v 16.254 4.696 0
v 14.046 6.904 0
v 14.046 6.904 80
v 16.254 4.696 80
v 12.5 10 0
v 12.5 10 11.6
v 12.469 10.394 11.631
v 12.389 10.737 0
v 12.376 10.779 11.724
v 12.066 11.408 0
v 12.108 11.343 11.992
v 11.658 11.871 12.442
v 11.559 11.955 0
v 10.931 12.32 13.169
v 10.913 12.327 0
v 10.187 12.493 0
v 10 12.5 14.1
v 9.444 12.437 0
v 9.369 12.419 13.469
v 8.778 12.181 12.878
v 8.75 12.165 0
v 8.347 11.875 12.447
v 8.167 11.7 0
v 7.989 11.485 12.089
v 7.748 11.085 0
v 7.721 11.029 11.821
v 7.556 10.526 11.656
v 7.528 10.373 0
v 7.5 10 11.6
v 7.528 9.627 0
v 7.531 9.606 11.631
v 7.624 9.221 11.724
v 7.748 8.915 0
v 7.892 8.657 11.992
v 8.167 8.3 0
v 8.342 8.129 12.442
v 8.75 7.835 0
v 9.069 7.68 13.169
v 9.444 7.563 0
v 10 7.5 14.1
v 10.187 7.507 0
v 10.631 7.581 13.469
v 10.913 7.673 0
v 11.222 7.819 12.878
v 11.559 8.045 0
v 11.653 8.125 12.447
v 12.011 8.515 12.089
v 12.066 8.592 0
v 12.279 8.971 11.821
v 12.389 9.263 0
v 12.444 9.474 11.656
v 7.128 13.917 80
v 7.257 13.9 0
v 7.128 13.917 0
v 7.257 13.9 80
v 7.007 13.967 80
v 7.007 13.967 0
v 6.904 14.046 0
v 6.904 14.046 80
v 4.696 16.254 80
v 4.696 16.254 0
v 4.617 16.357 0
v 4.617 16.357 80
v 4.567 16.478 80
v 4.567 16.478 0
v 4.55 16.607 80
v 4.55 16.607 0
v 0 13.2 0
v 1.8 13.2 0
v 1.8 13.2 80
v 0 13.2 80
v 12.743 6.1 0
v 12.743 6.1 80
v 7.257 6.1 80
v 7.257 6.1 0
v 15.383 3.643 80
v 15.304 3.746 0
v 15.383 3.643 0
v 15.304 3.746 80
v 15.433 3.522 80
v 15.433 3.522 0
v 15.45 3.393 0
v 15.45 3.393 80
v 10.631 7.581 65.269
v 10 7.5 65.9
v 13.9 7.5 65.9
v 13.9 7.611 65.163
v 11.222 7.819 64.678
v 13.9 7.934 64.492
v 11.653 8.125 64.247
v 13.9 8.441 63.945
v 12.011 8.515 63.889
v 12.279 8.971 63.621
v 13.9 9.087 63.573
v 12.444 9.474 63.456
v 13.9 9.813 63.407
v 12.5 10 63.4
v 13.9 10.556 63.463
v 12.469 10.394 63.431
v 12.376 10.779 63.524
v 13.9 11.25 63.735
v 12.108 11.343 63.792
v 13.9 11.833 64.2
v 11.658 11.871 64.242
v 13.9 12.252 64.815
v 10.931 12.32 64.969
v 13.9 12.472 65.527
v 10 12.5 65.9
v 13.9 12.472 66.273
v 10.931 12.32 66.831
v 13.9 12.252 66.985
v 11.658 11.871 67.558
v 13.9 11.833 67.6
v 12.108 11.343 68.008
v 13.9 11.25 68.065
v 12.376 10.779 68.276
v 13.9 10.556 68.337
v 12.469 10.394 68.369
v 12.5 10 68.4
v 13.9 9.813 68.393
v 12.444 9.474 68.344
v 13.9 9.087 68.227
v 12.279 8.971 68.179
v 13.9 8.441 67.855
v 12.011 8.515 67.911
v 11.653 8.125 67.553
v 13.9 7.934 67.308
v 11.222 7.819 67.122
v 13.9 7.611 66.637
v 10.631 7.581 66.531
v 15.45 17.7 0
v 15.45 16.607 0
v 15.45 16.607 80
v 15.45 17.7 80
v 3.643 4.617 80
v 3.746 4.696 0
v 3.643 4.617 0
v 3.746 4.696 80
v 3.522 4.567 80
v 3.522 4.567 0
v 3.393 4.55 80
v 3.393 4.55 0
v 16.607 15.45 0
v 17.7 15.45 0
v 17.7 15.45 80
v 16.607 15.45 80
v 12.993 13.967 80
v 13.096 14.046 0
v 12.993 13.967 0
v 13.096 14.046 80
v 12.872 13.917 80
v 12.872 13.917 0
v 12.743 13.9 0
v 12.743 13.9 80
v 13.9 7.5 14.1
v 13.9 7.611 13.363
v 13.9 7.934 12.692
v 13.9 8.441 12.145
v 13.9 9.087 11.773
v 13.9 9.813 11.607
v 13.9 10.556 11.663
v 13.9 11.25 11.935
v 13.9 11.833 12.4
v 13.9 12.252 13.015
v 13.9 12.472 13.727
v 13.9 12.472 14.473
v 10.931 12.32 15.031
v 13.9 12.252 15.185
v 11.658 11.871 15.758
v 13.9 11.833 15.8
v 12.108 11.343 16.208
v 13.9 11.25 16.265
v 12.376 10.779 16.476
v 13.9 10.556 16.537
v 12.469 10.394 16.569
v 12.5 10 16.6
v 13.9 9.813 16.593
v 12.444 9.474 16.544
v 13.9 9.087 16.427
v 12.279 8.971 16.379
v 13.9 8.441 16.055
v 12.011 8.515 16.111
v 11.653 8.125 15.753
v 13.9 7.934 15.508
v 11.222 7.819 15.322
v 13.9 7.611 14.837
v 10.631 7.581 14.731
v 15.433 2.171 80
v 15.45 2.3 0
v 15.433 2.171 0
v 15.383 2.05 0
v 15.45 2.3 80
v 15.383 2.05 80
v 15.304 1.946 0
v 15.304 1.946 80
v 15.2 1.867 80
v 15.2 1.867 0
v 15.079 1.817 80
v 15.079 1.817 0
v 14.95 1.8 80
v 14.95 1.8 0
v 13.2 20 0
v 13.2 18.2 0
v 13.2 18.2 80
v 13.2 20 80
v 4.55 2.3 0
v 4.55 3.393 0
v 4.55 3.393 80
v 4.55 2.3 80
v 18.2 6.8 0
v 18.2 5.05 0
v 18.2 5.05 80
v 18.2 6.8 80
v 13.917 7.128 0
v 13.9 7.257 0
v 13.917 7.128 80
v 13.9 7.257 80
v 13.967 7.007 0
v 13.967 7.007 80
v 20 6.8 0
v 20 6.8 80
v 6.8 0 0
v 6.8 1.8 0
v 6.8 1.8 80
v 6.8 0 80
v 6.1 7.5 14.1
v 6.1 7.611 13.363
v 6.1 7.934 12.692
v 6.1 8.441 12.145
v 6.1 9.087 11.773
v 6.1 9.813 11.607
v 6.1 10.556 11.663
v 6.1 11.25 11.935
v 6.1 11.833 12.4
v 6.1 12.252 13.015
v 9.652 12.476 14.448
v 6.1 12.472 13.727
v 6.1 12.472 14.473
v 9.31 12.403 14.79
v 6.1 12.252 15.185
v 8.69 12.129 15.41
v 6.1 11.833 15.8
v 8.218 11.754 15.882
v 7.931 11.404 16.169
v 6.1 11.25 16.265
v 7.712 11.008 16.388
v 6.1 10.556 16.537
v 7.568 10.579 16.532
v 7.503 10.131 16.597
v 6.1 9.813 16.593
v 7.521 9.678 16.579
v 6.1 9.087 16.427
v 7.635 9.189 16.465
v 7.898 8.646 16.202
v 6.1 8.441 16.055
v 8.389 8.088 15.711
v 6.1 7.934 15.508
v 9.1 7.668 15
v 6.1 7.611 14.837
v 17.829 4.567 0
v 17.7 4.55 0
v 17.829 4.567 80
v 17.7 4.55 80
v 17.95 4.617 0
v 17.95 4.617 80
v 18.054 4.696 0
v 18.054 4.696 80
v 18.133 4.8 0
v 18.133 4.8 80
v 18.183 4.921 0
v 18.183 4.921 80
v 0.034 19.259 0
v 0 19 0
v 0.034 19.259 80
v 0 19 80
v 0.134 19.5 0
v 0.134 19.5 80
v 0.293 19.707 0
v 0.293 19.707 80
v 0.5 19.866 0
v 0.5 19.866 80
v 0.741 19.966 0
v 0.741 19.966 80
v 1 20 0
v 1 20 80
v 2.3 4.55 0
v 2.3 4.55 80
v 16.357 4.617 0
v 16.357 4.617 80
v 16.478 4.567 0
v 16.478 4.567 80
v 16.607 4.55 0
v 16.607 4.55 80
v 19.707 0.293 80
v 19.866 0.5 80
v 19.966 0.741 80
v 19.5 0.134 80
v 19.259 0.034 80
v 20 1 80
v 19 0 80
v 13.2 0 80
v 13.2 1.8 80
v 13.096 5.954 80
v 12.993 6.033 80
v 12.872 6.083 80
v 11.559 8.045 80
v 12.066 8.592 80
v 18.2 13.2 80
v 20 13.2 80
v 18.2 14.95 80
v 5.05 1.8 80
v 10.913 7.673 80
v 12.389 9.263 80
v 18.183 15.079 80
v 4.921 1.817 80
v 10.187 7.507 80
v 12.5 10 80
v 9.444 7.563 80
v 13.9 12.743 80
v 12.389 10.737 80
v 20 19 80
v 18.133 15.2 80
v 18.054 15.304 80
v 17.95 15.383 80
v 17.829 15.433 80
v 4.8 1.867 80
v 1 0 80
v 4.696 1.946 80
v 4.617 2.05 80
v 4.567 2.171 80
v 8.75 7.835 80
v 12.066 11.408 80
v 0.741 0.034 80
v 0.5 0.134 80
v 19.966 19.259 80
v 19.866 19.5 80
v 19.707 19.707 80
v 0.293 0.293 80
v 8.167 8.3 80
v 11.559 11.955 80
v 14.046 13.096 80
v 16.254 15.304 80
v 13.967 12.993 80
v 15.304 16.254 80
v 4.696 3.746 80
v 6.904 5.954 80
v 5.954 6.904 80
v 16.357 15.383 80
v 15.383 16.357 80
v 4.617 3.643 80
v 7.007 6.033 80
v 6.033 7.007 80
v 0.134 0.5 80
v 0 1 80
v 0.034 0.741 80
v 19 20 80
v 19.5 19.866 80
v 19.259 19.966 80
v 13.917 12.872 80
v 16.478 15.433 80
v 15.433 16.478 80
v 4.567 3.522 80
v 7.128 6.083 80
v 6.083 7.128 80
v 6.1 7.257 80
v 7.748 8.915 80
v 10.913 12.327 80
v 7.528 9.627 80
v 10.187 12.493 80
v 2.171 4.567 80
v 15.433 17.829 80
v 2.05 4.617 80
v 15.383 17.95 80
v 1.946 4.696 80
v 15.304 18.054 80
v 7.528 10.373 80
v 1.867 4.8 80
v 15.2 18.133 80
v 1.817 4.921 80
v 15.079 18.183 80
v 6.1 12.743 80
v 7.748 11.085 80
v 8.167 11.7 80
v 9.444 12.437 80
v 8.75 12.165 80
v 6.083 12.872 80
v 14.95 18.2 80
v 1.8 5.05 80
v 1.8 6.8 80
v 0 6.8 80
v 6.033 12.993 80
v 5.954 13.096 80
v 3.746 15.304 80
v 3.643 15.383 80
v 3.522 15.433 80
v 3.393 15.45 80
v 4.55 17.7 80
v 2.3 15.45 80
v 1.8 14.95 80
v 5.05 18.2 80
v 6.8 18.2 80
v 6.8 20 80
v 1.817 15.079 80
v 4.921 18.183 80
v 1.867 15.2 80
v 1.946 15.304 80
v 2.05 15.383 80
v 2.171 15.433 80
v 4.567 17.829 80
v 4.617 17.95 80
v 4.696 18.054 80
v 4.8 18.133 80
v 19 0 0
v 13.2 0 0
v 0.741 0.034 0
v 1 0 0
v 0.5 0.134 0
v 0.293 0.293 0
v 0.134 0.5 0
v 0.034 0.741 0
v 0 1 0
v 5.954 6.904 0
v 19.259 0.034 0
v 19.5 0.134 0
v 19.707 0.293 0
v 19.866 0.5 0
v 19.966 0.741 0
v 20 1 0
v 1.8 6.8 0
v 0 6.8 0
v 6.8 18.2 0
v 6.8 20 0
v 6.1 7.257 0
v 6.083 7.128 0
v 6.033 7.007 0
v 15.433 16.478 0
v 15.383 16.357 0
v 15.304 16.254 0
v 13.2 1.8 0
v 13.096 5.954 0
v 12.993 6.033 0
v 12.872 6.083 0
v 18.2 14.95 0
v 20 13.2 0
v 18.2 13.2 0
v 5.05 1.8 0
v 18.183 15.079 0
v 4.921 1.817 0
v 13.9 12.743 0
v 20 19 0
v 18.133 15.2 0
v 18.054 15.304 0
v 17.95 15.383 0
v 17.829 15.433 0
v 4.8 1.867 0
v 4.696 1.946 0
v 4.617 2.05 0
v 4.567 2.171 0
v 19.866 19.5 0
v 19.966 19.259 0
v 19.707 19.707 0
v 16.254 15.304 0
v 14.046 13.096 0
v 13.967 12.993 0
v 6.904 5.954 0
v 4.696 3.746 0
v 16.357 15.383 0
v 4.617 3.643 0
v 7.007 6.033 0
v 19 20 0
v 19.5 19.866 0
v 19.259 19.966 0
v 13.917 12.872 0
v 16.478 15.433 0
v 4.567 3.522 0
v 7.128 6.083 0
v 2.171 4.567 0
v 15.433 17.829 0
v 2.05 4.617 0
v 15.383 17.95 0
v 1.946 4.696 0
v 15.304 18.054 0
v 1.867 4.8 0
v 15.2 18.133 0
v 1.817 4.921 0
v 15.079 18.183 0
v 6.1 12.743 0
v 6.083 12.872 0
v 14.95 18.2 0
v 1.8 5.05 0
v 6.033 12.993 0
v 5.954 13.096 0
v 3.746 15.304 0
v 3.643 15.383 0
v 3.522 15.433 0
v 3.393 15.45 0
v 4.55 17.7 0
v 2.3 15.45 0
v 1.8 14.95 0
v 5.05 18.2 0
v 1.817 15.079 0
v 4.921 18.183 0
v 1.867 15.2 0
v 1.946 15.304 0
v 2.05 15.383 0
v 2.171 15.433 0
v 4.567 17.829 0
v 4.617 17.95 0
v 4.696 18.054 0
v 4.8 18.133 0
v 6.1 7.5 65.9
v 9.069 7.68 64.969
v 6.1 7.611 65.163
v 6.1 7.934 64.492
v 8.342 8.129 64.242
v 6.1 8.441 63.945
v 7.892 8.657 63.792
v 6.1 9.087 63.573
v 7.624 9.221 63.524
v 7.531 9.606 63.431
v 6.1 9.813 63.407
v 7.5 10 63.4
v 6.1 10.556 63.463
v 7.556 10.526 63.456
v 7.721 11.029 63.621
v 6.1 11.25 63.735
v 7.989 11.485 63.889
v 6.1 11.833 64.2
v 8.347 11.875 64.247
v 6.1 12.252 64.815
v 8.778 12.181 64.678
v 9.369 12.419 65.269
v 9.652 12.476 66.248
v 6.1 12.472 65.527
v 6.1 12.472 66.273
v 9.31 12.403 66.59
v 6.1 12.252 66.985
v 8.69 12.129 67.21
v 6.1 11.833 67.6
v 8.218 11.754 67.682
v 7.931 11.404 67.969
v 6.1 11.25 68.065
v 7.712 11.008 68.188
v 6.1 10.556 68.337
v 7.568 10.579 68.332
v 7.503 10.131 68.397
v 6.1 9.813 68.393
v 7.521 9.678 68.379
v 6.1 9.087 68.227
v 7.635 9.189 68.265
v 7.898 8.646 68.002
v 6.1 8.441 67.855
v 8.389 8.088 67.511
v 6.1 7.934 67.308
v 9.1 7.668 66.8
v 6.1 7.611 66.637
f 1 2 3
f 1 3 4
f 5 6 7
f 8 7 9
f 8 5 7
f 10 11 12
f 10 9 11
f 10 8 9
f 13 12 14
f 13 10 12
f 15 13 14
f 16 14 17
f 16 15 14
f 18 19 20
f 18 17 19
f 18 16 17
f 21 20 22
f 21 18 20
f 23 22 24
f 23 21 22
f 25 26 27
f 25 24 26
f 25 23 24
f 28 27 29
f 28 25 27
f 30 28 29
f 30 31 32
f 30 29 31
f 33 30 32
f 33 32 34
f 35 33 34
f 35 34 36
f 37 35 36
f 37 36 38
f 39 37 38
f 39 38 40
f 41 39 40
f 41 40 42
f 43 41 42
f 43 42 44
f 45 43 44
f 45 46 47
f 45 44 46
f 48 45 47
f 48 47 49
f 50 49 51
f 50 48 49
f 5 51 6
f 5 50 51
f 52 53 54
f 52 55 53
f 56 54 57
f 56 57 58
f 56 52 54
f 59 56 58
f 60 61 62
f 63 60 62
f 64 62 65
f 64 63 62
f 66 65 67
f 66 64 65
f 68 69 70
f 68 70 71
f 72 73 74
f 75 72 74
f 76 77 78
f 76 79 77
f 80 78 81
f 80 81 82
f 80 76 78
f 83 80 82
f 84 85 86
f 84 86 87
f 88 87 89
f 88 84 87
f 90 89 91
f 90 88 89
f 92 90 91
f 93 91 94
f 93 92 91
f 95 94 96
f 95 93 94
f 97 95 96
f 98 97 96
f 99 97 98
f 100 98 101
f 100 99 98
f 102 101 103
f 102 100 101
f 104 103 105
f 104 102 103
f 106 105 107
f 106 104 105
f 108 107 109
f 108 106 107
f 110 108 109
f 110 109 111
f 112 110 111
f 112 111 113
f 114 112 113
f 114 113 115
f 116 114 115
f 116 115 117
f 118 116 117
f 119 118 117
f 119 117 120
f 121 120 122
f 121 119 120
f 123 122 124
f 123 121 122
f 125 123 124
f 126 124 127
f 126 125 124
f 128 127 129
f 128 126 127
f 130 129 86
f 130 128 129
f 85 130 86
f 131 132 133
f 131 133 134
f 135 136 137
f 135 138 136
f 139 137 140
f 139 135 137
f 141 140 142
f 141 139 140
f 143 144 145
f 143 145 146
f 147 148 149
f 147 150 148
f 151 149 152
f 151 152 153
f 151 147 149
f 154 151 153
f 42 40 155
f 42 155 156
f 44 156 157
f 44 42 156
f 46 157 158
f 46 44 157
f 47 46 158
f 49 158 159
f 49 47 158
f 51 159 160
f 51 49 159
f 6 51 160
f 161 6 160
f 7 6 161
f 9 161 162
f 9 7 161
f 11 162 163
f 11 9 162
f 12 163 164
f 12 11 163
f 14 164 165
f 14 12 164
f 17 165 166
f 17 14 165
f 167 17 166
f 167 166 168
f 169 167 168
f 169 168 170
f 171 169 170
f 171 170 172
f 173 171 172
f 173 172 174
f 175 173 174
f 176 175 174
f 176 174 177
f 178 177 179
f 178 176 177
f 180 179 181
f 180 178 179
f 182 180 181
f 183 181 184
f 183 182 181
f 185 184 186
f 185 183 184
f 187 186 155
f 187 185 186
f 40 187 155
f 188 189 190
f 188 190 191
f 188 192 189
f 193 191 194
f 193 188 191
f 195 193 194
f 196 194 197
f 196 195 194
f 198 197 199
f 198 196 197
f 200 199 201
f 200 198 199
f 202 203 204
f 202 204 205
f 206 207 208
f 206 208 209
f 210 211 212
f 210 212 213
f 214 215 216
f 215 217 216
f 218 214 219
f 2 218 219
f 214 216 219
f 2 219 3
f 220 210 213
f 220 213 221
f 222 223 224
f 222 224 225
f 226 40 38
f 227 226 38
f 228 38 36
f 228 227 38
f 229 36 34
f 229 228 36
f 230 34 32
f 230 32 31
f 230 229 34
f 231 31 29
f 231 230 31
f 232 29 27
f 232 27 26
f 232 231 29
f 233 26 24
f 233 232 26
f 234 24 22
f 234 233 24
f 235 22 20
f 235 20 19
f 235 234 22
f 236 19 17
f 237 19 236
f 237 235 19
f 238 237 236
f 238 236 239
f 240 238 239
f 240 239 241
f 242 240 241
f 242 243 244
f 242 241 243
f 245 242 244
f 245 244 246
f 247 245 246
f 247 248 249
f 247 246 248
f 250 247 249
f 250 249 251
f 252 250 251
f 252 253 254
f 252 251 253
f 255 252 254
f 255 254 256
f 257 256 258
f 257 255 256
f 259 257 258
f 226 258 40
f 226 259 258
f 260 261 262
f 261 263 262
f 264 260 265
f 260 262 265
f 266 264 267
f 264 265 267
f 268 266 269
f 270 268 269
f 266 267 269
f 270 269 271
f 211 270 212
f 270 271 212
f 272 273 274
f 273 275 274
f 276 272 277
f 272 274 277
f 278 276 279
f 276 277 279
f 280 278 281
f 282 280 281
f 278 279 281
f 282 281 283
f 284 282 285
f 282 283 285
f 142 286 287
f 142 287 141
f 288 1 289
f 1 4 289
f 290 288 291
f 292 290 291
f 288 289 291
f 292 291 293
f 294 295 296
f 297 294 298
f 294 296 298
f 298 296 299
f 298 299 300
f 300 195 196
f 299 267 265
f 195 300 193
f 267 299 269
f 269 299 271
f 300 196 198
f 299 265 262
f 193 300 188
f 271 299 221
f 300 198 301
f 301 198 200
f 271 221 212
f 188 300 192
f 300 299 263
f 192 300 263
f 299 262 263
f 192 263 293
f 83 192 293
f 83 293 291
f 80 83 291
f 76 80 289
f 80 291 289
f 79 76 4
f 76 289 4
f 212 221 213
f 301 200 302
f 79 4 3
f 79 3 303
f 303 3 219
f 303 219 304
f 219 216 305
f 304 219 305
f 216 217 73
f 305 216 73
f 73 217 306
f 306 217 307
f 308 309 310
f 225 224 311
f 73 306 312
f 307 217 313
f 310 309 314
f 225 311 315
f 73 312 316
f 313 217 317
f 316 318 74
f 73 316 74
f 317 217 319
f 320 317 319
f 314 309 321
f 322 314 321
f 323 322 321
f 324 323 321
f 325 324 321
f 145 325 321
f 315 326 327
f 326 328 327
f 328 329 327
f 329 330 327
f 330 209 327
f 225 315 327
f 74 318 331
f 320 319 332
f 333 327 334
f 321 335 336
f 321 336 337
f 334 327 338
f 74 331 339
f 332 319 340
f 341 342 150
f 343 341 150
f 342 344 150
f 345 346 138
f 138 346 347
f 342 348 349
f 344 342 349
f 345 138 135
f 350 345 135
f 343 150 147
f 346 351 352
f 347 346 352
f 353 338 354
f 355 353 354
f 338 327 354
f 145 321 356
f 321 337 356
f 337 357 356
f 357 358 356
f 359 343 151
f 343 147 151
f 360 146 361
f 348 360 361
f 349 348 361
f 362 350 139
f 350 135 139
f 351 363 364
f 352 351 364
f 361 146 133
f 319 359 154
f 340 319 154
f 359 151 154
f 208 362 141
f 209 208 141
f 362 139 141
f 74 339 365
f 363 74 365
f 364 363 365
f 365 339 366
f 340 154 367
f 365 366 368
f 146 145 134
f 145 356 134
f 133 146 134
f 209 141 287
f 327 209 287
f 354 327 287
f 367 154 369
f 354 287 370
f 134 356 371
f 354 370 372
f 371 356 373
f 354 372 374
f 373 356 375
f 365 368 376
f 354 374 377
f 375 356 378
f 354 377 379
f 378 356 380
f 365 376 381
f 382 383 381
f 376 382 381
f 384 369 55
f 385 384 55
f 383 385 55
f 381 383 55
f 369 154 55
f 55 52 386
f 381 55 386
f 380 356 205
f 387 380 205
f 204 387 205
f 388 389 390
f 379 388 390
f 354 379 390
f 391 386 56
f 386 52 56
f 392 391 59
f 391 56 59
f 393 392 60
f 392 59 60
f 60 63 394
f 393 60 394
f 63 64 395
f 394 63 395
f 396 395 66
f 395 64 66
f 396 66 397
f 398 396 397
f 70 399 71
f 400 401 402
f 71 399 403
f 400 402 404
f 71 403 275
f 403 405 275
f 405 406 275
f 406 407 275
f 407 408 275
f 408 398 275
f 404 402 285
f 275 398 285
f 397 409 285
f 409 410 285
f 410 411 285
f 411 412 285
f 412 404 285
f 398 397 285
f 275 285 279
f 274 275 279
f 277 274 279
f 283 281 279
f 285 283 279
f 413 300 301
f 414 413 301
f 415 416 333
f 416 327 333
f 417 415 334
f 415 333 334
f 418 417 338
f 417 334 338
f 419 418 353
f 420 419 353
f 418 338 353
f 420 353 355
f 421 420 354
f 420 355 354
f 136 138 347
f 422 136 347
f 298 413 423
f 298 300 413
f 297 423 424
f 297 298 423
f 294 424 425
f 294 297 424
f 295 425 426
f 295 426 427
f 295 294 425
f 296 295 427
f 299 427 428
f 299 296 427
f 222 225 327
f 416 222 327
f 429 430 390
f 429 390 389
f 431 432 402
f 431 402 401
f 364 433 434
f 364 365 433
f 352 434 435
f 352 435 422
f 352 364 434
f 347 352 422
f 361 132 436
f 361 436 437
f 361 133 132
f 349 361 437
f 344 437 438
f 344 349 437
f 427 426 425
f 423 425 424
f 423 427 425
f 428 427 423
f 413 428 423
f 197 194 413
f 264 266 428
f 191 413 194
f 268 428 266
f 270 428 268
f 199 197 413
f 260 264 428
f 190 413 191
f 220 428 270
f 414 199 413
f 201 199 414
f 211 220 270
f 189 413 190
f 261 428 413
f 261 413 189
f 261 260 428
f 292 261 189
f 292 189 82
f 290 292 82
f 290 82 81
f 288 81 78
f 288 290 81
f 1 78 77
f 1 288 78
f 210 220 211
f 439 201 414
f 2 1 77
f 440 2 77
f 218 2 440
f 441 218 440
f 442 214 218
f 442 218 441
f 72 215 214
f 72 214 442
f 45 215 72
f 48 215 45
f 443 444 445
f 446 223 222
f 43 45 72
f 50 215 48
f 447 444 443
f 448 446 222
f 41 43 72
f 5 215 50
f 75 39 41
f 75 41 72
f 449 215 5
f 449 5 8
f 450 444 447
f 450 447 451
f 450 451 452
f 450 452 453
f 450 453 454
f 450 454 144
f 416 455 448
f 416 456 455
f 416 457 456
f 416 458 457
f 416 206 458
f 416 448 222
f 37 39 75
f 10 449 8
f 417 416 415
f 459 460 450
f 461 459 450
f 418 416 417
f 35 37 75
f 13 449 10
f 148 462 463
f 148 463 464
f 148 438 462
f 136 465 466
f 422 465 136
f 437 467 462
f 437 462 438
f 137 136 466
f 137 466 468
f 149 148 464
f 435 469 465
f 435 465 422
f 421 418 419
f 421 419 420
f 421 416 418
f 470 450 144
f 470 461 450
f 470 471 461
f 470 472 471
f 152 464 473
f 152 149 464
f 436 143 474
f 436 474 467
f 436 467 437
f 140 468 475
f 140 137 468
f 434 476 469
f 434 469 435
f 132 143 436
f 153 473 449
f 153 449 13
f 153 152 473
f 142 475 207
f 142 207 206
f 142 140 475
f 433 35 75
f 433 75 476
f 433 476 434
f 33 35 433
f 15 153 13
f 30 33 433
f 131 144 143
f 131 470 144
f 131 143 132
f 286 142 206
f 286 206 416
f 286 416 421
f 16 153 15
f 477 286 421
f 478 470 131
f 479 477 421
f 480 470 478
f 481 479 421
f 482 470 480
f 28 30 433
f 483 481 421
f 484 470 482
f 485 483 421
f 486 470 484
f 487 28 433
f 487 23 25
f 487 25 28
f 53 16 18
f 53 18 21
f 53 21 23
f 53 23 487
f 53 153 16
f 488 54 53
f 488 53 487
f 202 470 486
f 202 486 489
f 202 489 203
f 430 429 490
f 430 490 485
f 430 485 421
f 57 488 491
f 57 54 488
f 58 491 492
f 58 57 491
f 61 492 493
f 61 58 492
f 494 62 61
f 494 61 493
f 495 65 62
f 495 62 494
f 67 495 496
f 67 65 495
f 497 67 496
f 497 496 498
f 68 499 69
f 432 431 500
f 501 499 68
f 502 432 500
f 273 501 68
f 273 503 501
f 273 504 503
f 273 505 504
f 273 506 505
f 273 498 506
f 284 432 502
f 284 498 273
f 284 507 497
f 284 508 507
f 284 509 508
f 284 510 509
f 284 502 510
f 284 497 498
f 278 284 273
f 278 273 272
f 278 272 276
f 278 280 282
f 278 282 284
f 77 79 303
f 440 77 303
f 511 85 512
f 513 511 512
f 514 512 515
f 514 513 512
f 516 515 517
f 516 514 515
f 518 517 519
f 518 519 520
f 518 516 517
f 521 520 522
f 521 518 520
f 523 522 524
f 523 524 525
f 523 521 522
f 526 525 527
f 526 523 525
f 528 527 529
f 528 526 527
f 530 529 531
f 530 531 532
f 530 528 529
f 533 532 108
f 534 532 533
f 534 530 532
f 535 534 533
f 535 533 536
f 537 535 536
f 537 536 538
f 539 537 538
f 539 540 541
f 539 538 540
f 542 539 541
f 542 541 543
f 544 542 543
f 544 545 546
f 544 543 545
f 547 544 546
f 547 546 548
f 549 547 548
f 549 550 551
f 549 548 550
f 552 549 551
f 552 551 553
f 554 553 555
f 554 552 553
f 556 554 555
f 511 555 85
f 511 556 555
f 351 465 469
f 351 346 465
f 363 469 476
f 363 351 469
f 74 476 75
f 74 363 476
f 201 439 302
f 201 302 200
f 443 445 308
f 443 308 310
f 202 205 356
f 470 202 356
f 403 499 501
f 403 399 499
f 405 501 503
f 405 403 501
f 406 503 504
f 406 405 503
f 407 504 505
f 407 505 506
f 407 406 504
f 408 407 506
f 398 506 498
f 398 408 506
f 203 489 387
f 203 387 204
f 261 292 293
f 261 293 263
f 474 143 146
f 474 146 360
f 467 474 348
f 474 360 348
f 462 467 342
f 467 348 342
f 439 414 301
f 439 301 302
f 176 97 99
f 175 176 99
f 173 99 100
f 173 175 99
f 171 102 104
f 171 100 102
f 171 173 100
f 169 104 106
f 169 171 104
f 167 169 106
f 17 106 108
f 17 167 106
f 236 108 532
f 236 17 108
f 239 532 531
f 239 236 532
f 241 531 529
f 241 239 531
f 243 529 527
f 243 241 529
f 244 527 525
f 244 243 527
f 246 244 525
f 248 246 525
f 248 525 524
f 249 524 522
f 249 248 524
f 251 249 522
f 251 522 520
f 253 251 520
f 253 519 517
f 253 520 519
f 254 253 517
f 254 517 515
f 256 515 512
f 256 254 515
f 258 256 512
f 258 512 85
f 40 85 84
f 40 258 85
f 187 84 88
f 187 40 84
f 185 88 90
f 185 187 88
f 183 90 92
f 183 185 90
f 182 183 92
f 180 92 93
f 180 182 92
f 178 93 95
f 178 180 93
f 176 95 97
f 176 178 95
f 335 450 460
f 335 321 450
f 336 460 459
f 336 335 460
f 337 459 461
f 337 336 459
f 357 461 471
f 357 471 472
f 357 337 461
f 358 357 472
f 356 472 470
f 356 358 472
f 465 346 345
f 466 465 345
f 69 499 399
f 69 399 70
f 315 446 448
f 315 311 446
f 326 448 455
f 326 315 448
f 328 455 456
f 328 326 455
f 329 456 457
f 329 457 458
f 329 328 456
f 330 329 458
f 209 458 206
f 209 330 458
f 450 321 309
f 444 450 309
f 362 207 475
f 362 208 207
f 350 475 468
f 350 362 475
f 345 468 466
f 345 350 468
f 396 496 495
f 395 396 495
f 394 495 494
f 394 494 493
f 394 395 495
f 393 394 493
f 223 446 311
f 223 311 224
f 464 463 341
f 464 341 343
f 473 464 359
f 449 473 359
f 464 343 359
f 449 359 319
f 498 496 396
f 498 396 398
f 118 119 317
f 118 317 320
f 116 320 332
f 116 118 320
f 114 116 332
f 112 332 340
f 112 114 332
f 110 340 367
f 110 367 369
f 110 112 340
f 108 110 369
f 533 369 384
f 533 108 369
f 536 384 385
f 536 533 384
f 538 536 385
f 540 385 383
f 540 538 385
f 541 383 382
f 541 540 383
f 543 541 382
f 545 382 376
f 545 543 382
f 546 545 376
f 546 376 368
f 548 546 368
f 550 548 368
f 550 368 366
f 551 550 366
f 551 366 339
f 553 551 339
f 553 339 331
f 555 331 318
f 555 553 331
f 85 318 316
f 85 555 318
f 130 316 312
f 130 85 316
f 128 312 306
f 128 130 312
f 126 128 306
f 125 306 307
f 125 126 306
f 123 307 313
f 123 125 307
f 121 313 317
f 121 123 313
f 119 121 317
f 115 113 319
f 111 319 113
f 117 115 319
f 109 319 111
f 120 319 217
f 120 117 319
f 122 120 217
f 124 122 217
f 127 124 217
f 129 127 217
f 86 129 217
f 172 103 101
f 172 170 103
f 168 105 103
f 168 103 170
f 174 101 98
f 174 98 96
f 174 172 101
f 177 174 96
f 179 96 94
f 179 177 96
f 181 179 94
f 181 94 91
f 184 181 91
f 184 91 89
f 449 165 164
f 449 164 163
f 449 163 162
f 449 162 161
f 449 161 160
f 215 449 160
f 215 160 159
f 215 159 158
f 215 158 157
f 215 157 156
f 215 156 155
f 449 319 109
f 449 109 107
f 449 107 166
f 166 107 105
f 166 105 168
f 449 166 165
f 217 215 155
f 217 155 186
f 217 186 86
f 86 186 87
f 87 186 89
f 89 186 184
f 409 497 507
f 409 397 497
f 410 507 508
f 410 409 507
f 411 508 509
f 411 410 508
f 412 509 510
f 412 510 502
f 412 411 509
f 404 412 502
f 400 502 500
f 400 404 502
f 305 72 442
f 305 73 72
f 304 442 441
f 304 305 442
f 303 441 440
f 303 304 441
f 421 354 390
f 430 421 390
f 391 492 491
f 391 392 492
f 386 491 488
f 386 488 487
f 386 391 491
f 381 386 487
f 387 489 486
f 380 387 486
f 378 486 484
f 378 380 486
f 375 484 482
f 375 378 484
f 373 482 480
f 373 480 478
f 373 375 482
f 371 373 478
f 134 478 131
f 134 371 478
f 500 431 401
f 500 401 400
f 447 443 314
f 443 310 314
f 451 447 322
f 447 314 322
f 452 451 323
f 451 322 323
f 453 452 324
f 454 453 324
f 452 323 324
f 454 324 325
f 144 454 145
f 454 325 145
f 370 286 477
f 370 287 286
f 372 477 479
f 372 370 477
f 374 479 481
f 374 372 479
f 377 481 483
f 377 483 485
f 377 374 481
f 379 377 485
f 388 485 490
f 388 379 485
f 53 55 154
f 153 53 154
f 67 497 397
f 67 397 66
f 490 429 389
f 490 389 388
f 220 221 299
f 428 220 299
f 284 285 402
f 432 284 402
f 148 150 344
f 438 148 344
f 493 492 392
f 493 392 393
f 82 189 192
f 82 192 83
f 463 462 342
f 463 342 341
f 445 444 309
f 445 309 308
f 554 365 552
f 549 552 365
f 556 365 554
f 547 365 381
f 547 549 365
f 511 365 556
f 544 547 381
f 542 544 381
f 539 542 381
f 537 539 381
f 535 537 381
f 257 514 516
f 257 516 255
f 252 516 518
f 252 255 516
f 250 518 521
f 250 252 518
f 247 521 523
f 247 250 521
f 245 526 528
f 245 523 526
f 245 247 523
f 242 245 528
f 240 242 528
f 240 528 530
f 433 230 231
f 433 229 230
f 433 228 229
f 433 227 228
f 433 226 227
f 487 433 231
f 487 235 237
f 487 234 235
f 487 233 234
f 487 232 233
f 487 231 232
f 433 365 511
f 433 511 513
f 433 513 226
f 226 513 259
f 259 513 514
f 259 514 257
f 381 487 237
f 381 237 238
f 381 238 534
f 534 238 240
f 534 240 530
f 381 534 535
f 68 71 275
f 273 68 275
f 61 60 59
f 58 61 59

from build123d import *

# Parameters (mm, degrees)
SKETCH1_R               = 2.5
BOSS_EXTRUDE1_DEPTH     = 80
FILLET1_R               = 1
FILLET2_R               = 0.5
FILLET3_R               = 0.5
FILLET4_R               = 0.5
FILLET5_R               = 0.5
CUT_EXTRUDE1_DEPTH      = 85.852813742
CUT_EXTRUDE1_DEPTH_BACK = 85.852813742
SKETCH2_R               = 2.5


with BuildPart() as part:
    # Sketch1 → Boss-Extrude1 (new body)
    with BuildSketch(Plane.XY):
        Polygon((13.2, 0), (13.2, 1.8), (15.45, 1.8), (15.45, 3.6), (12.95, 6.1), (7.05, 6.1), (4.55, 3.6), (4.55, 1.8), (6.8, 1.8), (6.8, 0), (0, 0), (0, 6.8), (1.8, 6.8), (1.8, 4.55), (3.6, 4.55), (6.1, 7.05), (6.1, 12.95), (3.6, 15.45), (1.8, 15.45), (1.8, 13.2), (0, 13.2), (0, 20), (6.8, 20), (6.8, 18.2), (4.55, 18.2), (4.55, 16.4), (7.05, 13.9), (12.95, 13.9), (15.45, 16.4), (15.45, 18.2), (13.2, 18.2), (13.2, 20), (20, 20), (20, 13.2), (18.2, 13.2), (18.2, 15.45), (16.4, 15.45), (13.9, 12.95), (13.9, 7.05), (16.4, 4.55), (18.2, 4.55), (18.2, 6.8), (20, 6.8), (20, 0), align=None)
        with Locations((10, 10)):
            Circle(SKETCH1_R, mode=Mode.SUBTRACT)
    extrude(amount=BOSS_EXTRUDE1_DEPTH)

    # Fillet1
    fillet1_edges = [part.edges().sort_by_distance(p)[0] for p in [
        (0, 0, 40),
        (0, 20, 40),
        (20, 20, 40),
        (20, 0, 40),
    ]]
    fillet(fillet1_edges, radius=FILLET1_R)

    # Fillet2
    fillet2_edges = [part.edges().sort_by_distance(p)[0] for p in [
        (4.55, 18.2, 40),
        (4.55, 16.4, 40),
        (7.05, 13.9, 40),
        (12.95, 13.9, 40),
        (15.45, 16.4, 40),
        (15.45, 18.2, 40),
    ]]
    fillet(fillet2_edges, radius=FILLET2_R)

    # Fillet3
    fillet3_edges = [part.edges().sort_by_distance(p)[0] for p in [
        (18.2, 15.45, 40),
        (16.4, 15.45, 40),
        (13.9, 12.95, 40),
        (13.9, 7.05, 40),
        (16.4, 4.55, 40),
        (18.2, 4.55, 40),
    ]]
    fillet(fillet3_edges, radius=FILLET3_R)

    # Fillet4
    fillet4_edges = [part.edges().sort_by_distance(p)[0] for p in [
        (1.8, 4.55, 40),
        (3.6, 4.55, 40),
        (6.1, 7.05, 40),
        (6.1, 12.95, 40),
        (3.6, 15.45, 40),
        (1.8, 15.45, 40),
    ]]
    fillet(fillet4_edges, radius=FILLET4_R)

    # Fillet5
    fillet5_edges = [part.edges().sort_by_distance(p)[0] for p in [
        (15.45, 1.8, 40),
        (15.45, 3.6, 40),
        (12.95, 6.1, 40),
        (7.05, 6.1, 40),
        (4.55, 3.6, 40),
        (4.55, 1.8, 40),
    ]]
    fillet(fillet5_edges, radius=FILLET5_R)

    # Sketch2 → Cut-Extrude1 (cut, two sides: drawn at the far end of the back side and taken through both)
    with BuildSketch(Plane(origin=(0, 0, 0), x_dir=(0, 0, -1), z_dir=(1, 0, 0)).offset(-CUT_EXTRUDE1_DEPTH_BACK)):
        with Locations(Location((-65.9, 10, 0), (0, 0, 270))):
            Circle(SKETCH2_R)
        with Locations(Location((-14.1, 10, 0), (0, 0, 270))):
            Circle(SKETCH2_R)
    extrude(amount=CUT_EXTRUDE1_DEPTH + CUT_EXTRUDE1_DEPTH_BACK, mode=Mode.SUBTRACT)


solid = part.part
